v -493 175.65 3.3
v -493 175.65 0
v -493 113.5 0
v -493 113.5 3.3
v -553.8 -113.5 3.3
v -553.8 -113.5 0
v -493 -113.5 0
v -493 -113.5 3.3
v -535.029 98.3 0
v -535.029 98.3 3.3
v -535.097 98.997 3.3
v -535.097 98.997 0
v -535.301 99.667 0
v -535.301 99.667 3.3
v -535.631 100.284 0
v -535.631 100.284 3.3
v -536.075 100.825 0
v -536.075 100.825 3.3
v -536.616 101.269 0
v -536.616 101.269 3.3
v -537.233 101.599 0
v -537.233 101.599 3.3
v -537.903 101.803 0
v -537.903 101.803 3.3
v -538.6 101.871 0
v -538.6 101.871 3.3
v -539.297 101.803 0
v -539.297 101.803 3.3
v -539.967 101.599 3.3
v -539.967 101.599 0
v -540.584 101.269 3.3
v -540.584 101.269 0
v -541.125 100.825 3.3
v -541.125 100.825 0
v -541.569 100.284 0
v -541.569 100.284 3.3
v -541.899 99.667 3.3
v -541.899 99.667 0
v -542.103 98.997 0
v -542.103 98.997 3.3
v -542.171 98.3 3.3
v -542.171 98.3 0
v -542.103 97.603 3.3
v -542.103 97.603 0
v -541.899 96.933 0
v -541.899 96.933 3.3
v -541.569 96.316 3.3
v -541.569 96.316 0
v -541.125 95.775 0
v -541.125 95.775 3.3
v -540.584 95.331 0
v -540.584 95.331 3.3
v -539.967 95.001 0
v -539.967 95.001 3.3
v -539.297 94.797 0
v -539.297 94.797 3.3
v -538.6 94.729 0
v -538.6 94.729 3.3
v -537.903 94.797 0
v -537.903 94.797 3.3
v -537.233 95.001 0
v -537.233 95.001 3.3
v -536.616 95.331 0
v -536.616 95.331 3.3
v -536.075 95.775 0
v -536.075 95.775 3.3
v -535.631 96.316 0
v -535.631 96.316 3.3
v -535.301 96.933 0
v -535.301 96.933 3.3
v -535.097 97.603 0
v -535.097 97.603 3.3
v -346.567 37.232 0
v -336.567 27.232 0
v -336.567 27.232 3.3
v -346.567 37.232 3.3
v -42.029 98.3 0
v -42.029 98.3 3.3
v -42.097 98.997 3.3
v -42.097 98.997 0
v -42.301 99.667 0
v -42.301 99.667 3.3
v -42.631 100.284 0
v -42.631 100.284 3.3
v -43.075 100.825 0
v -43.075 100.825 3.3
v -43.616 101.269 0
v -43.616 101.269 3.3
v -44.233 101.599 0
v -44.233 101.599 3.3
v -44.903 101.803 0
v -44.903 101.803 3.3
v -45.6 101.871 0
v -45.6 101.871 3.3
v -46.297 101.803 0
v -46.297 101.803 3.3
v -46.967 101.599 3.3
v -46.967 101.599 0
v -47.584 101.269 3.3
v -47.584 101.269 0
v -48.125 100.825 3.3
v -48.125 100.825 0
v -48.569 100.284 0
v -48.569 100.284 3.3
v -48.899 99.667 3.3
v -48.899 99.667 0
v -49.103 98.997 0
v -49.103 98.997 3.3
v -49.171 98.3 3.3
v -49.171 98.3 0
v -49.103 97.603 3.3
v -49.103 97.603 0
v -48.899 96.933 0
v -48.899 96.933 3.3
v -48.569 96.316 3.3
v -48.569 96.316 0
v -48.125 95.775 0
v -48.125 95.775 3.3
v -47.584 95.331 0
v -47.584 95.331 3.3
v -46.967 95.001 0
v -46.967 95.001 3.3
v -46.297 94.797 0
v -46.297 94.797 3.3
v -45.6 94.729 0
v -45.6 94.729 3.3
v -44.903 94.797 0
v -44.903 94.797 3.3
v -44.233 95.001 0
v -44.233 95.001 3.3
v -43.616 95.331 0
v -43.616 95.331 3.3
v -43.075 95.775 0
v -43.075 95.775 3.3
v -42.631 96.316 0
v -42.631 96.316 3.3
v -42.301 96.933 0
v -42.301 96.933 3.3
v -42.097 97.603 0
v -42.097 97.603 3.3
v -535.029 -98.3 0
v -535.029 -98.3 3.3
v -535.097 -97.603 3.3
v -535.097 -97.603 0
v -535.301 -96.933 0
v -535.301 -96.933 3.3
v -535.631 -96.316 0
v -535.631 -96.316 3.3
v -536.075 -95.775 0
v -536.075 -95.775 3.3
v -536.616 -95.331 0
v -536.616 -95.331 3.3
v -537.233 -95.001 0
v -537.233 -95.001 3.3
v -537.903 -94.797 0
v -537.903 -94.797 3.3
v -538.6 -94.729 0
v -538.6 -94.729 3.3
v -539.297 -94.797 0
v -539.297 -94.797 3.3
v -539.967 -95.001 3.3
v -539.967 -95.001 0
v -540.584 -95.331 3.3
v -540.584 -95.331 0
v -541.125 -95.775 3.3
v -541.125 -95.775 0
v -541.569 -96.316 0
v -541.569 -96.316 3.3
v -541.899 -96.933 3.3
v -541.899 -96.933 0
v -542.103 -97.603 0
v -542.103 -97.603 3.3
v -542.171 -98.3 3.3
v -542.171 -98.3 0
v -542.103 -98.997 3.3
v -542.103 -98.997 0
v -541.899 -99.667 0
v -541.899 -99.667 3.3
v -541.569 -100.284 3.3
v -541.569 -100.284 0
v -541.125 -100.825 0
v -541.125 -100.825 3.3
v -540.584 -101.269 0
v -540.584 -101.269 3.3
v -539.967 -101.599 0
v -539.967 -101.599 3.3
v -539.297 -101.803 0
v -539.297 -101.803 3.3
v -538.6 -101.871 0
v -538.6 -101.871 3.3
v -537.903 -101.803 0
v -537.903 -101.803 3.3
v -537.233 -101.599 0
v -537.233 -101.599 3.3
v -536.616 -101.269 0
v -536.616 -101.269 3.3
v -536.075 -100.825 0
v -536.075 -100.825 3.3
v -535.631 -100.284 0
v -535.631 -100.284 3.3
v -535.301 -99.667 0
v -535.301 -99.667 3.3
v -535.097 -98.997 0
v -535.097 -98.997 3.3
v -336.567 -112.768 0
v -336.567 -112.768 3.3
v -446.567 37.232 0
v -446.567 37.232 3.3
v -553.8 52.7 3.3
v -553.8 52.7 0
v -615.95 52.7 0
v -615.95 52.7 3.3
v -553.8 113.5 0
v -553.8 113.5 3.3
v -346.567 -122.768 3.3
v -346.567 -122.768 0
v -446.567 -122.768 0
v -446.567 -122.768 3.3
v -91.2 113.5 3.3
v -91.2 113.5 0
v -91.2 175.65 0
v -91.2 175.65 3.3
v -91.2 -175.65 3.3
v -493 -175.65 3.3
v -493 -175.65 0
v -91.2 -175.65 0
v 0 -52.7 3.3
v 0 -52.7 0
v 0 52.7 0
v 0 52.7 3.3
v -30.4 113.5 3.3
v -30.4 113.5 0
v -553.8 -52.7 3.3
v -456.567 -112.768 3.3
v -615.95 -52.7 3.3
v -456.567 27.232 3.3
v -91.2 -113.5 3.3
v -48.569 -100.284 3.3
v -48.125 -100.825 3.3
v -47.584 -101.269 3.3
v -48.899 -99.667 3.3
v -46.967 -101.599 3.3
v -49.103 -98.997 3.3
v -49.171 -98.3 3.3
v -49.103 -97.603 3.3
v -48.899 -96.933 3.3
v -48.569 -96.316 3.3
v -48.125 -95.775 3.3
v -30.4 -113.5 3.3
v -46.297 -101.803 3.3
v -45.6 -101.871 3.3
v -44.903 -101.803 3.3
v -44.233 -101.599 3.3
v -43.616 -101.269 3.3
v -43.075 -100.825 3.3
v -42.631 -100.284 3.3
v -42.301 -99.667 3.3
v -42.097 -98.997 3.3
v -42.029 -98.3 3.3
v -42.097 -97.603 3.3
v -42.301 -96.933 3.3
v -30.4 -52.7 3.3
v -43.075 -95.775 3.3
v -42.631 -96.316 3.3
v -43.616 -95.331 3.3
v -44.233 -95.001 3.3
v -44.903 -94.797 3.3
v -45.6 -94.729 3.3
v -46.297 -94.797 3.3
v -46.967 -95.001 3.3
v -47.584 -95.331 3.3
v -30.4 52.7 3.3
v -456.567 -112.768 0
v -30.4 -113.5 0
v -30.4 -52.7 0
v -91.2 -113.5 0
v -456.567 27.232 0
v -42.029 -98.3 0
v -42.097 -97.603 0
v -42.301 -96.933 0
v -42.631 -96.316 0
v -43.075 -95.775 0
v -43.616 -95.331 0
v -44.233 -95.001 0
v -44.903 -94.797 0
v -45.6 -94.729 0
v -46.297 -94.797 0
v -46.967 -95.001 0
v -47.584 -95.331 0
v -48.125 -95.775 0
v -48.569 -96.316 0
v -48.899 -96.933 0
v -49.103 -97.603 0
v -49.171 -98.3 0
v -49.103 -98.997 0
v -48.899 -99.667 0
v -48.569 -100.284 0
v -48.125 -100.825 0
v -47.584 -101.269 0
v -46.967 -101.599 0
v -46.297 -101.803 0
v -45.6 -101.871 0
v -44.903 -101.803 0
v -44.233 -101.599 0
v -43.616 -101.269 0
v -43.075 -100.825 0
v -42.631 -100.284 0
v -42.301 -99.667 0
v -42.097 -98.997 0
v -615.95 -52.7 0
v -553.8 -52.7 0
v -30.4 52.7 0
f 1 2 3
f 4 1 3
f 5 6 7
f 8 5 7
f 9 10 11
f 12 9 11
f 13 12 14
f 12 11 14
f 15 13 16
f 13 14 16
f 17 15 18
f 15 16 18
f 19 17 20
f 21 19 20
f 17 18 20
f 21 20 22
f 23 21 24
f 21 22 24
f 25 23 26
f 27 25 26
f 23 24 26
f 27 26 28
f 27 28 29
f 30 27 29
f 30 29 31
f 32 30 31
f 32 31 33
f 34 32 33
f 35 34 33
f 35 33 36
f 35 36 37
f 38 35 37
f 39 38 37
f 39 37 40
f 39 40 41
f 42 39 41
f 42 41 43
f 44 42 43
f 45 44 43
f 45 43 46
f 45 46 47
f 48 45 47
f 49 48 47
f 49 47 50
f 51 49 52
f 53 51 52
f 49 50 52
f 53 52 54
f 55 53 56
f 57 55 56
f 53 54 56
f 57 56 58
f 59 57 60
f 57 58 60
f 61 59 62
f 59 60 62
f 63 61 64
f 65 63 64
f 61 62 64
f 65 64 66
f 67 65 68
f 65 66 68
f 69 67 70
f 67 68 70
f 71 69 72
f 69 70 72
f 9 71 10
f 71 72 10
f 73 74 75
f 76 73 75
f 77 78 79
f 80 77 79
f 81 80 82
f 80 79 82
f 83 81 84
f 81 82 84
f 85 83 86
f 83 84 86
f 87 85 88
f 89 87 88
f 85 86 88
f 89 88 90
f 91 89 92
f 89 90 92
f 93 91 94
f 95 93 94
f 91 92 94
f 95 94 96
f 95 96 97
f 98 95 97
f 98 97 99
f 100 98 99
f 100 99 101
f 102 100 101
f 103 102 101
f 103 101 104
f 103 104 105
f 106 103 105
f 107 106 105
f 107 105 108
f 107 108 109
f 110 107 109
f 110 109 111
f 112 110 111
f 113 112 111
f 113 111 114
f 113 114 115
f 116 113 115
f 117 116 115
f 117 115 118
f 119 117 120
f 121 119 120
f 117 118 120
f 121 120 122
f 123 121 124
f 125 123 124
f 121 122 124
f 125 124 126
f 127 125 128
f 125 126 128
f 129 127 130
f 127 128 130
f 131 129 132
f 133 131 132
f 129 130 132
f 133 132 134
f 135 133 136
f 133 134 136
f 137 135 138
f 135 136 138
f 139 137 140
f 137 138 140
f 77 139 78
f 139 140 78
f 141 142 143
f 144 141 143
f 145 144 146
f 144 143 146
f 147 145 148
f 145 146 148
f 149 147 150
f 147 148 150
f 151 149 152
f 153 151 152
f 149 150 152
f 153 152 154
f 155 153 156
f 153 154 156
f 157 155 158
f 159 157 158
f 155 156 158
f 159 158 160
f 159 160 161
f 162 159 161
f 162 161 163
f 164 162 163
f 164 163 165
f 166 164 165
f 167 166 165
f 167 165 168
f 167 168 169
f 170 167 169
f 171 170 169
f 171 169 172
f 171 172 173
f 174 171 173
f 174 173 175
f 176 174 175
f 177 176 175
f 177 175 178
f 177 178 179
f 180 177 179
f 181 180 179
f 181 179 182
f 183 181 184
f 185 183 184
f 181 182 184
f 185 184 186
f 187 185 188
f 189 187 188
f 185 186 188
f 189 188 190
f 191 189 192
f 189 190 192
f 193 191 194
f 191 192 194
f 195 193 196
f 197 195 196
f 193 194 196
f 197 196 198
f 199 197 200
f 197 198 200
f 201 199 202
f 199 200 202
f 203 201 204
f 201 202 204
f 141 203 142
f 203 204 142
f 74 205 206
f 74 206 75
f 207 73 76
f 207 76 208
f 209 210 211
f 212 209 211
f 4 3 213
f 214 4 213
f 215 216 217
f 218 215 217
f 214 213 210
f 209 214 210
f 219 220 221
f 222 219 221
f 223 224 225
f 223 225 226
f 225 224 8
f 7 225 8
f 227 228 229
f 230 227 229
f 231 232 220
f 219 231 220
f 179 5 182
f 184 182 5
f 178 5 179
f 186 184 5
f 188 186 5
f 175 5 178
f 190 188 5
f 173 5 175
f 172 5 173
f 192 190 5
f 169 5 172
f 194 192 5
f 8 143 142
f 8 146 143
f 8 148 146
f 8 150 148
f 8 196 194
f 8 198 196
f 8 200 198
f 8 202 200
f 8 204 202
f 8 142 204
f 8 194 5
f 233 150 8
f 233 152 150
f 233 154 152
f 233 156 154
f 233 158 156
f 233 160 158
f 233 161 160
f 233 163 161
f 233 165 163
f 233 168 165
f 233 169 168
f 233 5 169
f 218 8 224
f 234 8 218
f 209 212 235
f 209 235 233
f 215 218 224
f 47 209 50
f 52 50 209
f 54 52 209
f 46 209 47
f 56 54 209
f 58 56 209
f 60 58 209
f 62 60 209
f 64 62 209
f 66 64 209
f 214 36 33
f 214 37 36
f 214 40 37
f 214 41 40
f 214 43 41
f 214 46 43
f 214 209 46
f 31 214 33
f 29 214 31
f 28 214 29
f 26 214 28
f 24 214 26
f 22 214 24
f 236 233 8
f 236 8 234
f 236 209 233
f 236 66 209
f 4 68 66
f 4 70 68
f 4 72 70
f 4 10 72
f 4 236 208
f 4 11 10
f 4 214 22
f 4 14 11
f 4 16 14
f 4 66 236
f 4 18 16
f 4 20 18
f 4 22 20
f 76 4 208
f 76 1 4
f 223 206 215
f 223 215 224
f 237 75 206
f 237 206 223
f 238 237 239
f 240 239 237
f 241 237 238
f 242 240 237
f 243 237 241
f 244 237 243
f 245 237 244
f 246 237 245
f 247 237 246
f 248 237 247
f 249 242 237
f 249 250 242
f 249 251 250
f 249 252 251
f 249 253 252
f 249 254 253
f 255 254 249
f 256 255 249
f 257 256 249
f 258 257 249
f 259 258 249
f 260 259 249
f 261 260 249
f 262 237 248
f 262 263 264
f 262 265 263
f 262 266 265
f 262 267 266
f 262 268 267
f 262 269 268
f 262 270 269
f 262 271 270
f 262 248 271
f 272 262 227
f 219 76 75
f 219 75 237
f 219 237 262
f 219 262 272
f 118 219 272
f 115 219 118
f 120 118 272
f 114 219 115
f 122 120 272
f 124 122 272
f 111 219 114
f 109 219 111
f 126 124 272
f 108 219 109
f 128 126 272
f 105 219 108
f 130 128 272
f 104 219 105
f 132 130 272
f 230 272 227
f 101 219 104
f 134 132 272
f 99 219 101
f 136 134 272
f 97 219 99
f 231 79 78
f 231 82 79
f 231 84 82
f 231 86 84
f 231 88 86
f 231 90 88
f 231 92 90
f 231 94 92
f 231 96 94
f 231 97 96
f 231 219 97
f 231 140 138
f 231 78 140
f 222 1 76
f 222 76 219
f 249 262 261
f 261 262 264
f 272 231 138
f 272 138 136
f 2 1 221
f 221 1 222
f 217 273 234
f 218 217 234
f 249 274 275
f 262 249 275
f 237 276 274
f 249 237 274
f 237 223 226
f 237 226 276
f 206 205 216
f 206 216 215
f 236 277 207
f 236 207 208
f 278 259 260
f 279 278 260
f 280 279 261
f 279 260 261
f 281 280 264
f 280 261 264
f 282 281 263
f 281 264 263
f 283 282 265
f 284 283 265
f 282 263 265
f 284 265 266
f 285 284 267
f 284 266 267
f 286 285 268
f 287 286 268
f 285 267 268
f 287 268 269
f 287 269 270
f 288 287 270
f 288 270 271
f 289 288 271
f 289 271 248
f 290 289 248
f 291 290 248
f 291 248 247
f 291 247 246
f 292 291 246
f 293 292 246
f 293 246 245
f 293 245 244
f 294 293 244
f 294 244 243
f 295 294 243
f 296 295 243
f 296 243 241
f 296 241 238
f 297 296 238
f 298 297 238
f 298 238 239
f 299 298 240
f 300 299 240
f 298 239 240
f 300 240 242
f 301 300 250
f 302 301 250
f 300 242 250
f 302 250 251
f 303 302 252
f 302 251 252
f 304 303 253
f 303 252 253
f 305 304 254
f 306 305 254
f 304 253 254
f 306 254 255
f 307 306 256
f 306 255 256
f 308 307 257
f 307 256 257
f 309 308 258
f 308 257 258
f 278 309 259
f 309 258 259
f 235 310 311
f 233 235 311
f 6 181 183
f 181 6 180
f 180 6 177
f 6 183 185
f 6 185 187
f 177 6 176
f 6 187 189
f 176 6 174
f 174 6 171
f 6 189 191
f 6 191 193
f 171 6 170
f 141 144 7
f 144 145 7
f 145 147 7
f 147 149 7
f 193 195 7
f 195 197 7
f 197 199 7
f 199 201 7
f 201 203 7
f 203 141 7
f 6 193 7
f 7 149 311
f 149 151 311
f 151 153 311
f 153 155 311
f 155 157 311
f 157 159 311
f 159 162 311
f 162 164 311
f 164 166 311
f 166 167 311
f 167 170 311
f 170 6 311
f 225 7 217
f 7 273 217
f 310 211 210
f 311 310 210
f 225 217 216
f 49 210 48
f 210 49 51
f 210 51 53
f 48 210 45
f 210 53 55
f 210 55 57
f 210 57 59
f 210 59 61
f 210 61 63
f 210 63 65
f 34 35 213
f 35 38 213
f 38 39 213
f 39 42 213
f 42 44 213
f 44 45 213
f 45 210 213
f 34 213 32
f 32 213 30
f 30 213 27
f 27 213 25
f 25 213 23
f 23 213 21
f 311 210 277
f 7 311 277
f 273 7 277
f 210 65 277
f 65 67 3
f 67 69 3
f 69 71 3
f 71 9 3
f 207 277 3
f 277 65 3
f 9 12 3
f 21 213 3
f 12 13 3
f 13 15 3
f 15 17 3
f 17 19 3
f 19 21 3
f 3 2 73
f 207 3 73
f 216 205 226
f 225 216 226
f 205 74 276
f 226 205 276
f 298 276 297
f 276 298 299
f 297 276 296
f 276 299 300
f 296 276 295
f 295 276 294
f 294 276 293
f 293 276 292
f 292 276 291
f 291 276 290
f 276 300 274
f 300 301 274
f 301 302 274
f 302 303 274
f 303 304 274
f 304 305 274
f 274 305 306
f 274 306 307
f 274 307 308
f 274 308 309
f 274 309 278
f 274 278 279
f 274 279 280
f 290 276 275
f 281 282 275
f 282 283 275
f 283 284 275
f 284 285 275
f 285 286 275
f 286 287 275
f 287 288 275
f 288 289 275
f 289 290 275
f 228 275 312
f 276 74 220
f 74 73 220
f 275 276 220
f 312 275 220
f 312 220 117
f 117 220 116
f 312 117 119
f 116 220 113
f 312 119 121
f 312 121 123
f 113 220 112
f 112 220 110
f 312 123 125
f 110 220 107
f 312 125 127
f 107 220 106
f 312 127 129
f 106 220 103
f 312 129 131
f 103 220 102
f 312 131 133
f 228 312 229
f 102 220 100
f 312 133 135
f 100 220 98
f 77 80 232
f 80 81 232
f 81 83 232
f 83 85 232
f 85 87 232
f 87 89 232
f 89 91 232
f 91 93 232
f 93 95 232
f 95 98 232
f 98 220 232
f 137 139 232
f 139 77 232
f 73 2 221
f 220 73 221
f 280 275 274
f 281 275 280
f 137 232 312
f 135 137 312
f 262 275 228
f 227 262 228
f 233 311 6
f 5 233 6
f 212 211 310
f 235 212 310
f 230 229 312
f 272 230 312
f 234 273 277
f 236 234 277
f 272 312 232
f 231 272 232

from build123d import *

# Parameters (mm, degrees)
BOSS_EXTRU_1_DEPTH      = 3.3
ESQUISSE2_W             = 401.8
ESQUISSE2_H             = 6.35
ENL_V_MAT_EXTRU_1_DEPTH = 643.284432709
D_GAGEMENT_1_41_D       = 7.14248
ESQUISSE5_W             = 401.8
ESQUISSE5_H             = 1.35
BOSS_EXTRU_2_DEPTH      = 3.3
ESQUISSE6_W             = 120
ESQUISSE6_H             = 160
ENL_V_MAT_EXTRU_2_DEPTH = 641.514024046
CHANFREIN1_SIZE         = 10


with BuildPart() as part:
    # Esquisse1 → Boss.-Extru.1 (new body)
    with BuildSketch(Plane.XY):
        Polygon((-615.95, 52.7), (-615.95, -52.7), (-553.8, -52.7), (-553.8, -113.5), (-493, -113.5), (-493, -174.3), (-91.2, -174.3), (-91.2, -113.5), (-30.4, -113.5), (-30.4, -52.7), (0, -52.7), (0, 52.7), (-30.4, 52.7), (-30.4, 113.5), (-91.2, 113.5), (-91.2, 182), (-493, 182), (-493, 113.5), (-553.8, 113.5), (-553.8, 52.7), align=None)
    extrude(amount=BOSS_EXTRU_1_DEPTH)

    # Esquisse2 → Enlèv. mat.-Extru.1 (cut, through all)
    with BuildSketch(Plane.XY.offset(3.3)):
        with Locations((-292.1, 178.825)):
            Rectangle(ESQUISSE2_W, ESQUISSE2_H)
    extrude(amount=-ENL_V_MAT_EXTRU_1_DEPTH, mode=Mode.SUBTRACT)

    # Dégagement 1/41 (through all)
    with Locations(Plane(origin=(0, 0, 0), x_dir=(-1, 0, 0), z_dir=(0, 0, -1))):
        with Locations((45.6, 98.3), (45.6, -98.3), (538.6, -98.3), (538.6, 98.3)):
            Hole(D_GAGEMENT_1_41_D / 2)

    # Esquisse5 → Boss.-Extru.2 (add, through all)
    with BuildSketch(Plane.XY.offset(3.3)):
        with Locations((-292.1, -174.975)):
            Rectangle(ESQUISSE5_W, ESQUISSE5_H)
    extrude(amount=-BOSS_EXTRU_2_DEPTH)

    # Esquisse6 → Enlèv. mat.-Extru.2 (cut, through all)
    with BuildSketch(Plane(origin=(0, 0, 0), x_dir=(-1, 0, 0), z_dir=(0, 0, -1))):
        with Locations((396.566519887, -42.768394731)):
            Rectangle(ESQUISSE6_W, ESQUISSE6_H)
    extrude(amount=-ENL_V_MAT_EXTRU_2_DEPTH, mode=Mode.SUBTRACT)

    # Chanfrein1
    chanfrein1_edges = [part.edges().sort_by_distance(p)[0] for p in [
        (-336.566519887, -122.768394731, 1.65),
        (-336.566519887, 37.231605269, 1.65),
        (-456.566519887, 37.231605269, 1.65),
        (-456.566519887, -122.768394731, 1.65),
    ]]
    chamfer(chanfrein1_edges, length=CHANFREIN1_SIZE)


solid = part.part
